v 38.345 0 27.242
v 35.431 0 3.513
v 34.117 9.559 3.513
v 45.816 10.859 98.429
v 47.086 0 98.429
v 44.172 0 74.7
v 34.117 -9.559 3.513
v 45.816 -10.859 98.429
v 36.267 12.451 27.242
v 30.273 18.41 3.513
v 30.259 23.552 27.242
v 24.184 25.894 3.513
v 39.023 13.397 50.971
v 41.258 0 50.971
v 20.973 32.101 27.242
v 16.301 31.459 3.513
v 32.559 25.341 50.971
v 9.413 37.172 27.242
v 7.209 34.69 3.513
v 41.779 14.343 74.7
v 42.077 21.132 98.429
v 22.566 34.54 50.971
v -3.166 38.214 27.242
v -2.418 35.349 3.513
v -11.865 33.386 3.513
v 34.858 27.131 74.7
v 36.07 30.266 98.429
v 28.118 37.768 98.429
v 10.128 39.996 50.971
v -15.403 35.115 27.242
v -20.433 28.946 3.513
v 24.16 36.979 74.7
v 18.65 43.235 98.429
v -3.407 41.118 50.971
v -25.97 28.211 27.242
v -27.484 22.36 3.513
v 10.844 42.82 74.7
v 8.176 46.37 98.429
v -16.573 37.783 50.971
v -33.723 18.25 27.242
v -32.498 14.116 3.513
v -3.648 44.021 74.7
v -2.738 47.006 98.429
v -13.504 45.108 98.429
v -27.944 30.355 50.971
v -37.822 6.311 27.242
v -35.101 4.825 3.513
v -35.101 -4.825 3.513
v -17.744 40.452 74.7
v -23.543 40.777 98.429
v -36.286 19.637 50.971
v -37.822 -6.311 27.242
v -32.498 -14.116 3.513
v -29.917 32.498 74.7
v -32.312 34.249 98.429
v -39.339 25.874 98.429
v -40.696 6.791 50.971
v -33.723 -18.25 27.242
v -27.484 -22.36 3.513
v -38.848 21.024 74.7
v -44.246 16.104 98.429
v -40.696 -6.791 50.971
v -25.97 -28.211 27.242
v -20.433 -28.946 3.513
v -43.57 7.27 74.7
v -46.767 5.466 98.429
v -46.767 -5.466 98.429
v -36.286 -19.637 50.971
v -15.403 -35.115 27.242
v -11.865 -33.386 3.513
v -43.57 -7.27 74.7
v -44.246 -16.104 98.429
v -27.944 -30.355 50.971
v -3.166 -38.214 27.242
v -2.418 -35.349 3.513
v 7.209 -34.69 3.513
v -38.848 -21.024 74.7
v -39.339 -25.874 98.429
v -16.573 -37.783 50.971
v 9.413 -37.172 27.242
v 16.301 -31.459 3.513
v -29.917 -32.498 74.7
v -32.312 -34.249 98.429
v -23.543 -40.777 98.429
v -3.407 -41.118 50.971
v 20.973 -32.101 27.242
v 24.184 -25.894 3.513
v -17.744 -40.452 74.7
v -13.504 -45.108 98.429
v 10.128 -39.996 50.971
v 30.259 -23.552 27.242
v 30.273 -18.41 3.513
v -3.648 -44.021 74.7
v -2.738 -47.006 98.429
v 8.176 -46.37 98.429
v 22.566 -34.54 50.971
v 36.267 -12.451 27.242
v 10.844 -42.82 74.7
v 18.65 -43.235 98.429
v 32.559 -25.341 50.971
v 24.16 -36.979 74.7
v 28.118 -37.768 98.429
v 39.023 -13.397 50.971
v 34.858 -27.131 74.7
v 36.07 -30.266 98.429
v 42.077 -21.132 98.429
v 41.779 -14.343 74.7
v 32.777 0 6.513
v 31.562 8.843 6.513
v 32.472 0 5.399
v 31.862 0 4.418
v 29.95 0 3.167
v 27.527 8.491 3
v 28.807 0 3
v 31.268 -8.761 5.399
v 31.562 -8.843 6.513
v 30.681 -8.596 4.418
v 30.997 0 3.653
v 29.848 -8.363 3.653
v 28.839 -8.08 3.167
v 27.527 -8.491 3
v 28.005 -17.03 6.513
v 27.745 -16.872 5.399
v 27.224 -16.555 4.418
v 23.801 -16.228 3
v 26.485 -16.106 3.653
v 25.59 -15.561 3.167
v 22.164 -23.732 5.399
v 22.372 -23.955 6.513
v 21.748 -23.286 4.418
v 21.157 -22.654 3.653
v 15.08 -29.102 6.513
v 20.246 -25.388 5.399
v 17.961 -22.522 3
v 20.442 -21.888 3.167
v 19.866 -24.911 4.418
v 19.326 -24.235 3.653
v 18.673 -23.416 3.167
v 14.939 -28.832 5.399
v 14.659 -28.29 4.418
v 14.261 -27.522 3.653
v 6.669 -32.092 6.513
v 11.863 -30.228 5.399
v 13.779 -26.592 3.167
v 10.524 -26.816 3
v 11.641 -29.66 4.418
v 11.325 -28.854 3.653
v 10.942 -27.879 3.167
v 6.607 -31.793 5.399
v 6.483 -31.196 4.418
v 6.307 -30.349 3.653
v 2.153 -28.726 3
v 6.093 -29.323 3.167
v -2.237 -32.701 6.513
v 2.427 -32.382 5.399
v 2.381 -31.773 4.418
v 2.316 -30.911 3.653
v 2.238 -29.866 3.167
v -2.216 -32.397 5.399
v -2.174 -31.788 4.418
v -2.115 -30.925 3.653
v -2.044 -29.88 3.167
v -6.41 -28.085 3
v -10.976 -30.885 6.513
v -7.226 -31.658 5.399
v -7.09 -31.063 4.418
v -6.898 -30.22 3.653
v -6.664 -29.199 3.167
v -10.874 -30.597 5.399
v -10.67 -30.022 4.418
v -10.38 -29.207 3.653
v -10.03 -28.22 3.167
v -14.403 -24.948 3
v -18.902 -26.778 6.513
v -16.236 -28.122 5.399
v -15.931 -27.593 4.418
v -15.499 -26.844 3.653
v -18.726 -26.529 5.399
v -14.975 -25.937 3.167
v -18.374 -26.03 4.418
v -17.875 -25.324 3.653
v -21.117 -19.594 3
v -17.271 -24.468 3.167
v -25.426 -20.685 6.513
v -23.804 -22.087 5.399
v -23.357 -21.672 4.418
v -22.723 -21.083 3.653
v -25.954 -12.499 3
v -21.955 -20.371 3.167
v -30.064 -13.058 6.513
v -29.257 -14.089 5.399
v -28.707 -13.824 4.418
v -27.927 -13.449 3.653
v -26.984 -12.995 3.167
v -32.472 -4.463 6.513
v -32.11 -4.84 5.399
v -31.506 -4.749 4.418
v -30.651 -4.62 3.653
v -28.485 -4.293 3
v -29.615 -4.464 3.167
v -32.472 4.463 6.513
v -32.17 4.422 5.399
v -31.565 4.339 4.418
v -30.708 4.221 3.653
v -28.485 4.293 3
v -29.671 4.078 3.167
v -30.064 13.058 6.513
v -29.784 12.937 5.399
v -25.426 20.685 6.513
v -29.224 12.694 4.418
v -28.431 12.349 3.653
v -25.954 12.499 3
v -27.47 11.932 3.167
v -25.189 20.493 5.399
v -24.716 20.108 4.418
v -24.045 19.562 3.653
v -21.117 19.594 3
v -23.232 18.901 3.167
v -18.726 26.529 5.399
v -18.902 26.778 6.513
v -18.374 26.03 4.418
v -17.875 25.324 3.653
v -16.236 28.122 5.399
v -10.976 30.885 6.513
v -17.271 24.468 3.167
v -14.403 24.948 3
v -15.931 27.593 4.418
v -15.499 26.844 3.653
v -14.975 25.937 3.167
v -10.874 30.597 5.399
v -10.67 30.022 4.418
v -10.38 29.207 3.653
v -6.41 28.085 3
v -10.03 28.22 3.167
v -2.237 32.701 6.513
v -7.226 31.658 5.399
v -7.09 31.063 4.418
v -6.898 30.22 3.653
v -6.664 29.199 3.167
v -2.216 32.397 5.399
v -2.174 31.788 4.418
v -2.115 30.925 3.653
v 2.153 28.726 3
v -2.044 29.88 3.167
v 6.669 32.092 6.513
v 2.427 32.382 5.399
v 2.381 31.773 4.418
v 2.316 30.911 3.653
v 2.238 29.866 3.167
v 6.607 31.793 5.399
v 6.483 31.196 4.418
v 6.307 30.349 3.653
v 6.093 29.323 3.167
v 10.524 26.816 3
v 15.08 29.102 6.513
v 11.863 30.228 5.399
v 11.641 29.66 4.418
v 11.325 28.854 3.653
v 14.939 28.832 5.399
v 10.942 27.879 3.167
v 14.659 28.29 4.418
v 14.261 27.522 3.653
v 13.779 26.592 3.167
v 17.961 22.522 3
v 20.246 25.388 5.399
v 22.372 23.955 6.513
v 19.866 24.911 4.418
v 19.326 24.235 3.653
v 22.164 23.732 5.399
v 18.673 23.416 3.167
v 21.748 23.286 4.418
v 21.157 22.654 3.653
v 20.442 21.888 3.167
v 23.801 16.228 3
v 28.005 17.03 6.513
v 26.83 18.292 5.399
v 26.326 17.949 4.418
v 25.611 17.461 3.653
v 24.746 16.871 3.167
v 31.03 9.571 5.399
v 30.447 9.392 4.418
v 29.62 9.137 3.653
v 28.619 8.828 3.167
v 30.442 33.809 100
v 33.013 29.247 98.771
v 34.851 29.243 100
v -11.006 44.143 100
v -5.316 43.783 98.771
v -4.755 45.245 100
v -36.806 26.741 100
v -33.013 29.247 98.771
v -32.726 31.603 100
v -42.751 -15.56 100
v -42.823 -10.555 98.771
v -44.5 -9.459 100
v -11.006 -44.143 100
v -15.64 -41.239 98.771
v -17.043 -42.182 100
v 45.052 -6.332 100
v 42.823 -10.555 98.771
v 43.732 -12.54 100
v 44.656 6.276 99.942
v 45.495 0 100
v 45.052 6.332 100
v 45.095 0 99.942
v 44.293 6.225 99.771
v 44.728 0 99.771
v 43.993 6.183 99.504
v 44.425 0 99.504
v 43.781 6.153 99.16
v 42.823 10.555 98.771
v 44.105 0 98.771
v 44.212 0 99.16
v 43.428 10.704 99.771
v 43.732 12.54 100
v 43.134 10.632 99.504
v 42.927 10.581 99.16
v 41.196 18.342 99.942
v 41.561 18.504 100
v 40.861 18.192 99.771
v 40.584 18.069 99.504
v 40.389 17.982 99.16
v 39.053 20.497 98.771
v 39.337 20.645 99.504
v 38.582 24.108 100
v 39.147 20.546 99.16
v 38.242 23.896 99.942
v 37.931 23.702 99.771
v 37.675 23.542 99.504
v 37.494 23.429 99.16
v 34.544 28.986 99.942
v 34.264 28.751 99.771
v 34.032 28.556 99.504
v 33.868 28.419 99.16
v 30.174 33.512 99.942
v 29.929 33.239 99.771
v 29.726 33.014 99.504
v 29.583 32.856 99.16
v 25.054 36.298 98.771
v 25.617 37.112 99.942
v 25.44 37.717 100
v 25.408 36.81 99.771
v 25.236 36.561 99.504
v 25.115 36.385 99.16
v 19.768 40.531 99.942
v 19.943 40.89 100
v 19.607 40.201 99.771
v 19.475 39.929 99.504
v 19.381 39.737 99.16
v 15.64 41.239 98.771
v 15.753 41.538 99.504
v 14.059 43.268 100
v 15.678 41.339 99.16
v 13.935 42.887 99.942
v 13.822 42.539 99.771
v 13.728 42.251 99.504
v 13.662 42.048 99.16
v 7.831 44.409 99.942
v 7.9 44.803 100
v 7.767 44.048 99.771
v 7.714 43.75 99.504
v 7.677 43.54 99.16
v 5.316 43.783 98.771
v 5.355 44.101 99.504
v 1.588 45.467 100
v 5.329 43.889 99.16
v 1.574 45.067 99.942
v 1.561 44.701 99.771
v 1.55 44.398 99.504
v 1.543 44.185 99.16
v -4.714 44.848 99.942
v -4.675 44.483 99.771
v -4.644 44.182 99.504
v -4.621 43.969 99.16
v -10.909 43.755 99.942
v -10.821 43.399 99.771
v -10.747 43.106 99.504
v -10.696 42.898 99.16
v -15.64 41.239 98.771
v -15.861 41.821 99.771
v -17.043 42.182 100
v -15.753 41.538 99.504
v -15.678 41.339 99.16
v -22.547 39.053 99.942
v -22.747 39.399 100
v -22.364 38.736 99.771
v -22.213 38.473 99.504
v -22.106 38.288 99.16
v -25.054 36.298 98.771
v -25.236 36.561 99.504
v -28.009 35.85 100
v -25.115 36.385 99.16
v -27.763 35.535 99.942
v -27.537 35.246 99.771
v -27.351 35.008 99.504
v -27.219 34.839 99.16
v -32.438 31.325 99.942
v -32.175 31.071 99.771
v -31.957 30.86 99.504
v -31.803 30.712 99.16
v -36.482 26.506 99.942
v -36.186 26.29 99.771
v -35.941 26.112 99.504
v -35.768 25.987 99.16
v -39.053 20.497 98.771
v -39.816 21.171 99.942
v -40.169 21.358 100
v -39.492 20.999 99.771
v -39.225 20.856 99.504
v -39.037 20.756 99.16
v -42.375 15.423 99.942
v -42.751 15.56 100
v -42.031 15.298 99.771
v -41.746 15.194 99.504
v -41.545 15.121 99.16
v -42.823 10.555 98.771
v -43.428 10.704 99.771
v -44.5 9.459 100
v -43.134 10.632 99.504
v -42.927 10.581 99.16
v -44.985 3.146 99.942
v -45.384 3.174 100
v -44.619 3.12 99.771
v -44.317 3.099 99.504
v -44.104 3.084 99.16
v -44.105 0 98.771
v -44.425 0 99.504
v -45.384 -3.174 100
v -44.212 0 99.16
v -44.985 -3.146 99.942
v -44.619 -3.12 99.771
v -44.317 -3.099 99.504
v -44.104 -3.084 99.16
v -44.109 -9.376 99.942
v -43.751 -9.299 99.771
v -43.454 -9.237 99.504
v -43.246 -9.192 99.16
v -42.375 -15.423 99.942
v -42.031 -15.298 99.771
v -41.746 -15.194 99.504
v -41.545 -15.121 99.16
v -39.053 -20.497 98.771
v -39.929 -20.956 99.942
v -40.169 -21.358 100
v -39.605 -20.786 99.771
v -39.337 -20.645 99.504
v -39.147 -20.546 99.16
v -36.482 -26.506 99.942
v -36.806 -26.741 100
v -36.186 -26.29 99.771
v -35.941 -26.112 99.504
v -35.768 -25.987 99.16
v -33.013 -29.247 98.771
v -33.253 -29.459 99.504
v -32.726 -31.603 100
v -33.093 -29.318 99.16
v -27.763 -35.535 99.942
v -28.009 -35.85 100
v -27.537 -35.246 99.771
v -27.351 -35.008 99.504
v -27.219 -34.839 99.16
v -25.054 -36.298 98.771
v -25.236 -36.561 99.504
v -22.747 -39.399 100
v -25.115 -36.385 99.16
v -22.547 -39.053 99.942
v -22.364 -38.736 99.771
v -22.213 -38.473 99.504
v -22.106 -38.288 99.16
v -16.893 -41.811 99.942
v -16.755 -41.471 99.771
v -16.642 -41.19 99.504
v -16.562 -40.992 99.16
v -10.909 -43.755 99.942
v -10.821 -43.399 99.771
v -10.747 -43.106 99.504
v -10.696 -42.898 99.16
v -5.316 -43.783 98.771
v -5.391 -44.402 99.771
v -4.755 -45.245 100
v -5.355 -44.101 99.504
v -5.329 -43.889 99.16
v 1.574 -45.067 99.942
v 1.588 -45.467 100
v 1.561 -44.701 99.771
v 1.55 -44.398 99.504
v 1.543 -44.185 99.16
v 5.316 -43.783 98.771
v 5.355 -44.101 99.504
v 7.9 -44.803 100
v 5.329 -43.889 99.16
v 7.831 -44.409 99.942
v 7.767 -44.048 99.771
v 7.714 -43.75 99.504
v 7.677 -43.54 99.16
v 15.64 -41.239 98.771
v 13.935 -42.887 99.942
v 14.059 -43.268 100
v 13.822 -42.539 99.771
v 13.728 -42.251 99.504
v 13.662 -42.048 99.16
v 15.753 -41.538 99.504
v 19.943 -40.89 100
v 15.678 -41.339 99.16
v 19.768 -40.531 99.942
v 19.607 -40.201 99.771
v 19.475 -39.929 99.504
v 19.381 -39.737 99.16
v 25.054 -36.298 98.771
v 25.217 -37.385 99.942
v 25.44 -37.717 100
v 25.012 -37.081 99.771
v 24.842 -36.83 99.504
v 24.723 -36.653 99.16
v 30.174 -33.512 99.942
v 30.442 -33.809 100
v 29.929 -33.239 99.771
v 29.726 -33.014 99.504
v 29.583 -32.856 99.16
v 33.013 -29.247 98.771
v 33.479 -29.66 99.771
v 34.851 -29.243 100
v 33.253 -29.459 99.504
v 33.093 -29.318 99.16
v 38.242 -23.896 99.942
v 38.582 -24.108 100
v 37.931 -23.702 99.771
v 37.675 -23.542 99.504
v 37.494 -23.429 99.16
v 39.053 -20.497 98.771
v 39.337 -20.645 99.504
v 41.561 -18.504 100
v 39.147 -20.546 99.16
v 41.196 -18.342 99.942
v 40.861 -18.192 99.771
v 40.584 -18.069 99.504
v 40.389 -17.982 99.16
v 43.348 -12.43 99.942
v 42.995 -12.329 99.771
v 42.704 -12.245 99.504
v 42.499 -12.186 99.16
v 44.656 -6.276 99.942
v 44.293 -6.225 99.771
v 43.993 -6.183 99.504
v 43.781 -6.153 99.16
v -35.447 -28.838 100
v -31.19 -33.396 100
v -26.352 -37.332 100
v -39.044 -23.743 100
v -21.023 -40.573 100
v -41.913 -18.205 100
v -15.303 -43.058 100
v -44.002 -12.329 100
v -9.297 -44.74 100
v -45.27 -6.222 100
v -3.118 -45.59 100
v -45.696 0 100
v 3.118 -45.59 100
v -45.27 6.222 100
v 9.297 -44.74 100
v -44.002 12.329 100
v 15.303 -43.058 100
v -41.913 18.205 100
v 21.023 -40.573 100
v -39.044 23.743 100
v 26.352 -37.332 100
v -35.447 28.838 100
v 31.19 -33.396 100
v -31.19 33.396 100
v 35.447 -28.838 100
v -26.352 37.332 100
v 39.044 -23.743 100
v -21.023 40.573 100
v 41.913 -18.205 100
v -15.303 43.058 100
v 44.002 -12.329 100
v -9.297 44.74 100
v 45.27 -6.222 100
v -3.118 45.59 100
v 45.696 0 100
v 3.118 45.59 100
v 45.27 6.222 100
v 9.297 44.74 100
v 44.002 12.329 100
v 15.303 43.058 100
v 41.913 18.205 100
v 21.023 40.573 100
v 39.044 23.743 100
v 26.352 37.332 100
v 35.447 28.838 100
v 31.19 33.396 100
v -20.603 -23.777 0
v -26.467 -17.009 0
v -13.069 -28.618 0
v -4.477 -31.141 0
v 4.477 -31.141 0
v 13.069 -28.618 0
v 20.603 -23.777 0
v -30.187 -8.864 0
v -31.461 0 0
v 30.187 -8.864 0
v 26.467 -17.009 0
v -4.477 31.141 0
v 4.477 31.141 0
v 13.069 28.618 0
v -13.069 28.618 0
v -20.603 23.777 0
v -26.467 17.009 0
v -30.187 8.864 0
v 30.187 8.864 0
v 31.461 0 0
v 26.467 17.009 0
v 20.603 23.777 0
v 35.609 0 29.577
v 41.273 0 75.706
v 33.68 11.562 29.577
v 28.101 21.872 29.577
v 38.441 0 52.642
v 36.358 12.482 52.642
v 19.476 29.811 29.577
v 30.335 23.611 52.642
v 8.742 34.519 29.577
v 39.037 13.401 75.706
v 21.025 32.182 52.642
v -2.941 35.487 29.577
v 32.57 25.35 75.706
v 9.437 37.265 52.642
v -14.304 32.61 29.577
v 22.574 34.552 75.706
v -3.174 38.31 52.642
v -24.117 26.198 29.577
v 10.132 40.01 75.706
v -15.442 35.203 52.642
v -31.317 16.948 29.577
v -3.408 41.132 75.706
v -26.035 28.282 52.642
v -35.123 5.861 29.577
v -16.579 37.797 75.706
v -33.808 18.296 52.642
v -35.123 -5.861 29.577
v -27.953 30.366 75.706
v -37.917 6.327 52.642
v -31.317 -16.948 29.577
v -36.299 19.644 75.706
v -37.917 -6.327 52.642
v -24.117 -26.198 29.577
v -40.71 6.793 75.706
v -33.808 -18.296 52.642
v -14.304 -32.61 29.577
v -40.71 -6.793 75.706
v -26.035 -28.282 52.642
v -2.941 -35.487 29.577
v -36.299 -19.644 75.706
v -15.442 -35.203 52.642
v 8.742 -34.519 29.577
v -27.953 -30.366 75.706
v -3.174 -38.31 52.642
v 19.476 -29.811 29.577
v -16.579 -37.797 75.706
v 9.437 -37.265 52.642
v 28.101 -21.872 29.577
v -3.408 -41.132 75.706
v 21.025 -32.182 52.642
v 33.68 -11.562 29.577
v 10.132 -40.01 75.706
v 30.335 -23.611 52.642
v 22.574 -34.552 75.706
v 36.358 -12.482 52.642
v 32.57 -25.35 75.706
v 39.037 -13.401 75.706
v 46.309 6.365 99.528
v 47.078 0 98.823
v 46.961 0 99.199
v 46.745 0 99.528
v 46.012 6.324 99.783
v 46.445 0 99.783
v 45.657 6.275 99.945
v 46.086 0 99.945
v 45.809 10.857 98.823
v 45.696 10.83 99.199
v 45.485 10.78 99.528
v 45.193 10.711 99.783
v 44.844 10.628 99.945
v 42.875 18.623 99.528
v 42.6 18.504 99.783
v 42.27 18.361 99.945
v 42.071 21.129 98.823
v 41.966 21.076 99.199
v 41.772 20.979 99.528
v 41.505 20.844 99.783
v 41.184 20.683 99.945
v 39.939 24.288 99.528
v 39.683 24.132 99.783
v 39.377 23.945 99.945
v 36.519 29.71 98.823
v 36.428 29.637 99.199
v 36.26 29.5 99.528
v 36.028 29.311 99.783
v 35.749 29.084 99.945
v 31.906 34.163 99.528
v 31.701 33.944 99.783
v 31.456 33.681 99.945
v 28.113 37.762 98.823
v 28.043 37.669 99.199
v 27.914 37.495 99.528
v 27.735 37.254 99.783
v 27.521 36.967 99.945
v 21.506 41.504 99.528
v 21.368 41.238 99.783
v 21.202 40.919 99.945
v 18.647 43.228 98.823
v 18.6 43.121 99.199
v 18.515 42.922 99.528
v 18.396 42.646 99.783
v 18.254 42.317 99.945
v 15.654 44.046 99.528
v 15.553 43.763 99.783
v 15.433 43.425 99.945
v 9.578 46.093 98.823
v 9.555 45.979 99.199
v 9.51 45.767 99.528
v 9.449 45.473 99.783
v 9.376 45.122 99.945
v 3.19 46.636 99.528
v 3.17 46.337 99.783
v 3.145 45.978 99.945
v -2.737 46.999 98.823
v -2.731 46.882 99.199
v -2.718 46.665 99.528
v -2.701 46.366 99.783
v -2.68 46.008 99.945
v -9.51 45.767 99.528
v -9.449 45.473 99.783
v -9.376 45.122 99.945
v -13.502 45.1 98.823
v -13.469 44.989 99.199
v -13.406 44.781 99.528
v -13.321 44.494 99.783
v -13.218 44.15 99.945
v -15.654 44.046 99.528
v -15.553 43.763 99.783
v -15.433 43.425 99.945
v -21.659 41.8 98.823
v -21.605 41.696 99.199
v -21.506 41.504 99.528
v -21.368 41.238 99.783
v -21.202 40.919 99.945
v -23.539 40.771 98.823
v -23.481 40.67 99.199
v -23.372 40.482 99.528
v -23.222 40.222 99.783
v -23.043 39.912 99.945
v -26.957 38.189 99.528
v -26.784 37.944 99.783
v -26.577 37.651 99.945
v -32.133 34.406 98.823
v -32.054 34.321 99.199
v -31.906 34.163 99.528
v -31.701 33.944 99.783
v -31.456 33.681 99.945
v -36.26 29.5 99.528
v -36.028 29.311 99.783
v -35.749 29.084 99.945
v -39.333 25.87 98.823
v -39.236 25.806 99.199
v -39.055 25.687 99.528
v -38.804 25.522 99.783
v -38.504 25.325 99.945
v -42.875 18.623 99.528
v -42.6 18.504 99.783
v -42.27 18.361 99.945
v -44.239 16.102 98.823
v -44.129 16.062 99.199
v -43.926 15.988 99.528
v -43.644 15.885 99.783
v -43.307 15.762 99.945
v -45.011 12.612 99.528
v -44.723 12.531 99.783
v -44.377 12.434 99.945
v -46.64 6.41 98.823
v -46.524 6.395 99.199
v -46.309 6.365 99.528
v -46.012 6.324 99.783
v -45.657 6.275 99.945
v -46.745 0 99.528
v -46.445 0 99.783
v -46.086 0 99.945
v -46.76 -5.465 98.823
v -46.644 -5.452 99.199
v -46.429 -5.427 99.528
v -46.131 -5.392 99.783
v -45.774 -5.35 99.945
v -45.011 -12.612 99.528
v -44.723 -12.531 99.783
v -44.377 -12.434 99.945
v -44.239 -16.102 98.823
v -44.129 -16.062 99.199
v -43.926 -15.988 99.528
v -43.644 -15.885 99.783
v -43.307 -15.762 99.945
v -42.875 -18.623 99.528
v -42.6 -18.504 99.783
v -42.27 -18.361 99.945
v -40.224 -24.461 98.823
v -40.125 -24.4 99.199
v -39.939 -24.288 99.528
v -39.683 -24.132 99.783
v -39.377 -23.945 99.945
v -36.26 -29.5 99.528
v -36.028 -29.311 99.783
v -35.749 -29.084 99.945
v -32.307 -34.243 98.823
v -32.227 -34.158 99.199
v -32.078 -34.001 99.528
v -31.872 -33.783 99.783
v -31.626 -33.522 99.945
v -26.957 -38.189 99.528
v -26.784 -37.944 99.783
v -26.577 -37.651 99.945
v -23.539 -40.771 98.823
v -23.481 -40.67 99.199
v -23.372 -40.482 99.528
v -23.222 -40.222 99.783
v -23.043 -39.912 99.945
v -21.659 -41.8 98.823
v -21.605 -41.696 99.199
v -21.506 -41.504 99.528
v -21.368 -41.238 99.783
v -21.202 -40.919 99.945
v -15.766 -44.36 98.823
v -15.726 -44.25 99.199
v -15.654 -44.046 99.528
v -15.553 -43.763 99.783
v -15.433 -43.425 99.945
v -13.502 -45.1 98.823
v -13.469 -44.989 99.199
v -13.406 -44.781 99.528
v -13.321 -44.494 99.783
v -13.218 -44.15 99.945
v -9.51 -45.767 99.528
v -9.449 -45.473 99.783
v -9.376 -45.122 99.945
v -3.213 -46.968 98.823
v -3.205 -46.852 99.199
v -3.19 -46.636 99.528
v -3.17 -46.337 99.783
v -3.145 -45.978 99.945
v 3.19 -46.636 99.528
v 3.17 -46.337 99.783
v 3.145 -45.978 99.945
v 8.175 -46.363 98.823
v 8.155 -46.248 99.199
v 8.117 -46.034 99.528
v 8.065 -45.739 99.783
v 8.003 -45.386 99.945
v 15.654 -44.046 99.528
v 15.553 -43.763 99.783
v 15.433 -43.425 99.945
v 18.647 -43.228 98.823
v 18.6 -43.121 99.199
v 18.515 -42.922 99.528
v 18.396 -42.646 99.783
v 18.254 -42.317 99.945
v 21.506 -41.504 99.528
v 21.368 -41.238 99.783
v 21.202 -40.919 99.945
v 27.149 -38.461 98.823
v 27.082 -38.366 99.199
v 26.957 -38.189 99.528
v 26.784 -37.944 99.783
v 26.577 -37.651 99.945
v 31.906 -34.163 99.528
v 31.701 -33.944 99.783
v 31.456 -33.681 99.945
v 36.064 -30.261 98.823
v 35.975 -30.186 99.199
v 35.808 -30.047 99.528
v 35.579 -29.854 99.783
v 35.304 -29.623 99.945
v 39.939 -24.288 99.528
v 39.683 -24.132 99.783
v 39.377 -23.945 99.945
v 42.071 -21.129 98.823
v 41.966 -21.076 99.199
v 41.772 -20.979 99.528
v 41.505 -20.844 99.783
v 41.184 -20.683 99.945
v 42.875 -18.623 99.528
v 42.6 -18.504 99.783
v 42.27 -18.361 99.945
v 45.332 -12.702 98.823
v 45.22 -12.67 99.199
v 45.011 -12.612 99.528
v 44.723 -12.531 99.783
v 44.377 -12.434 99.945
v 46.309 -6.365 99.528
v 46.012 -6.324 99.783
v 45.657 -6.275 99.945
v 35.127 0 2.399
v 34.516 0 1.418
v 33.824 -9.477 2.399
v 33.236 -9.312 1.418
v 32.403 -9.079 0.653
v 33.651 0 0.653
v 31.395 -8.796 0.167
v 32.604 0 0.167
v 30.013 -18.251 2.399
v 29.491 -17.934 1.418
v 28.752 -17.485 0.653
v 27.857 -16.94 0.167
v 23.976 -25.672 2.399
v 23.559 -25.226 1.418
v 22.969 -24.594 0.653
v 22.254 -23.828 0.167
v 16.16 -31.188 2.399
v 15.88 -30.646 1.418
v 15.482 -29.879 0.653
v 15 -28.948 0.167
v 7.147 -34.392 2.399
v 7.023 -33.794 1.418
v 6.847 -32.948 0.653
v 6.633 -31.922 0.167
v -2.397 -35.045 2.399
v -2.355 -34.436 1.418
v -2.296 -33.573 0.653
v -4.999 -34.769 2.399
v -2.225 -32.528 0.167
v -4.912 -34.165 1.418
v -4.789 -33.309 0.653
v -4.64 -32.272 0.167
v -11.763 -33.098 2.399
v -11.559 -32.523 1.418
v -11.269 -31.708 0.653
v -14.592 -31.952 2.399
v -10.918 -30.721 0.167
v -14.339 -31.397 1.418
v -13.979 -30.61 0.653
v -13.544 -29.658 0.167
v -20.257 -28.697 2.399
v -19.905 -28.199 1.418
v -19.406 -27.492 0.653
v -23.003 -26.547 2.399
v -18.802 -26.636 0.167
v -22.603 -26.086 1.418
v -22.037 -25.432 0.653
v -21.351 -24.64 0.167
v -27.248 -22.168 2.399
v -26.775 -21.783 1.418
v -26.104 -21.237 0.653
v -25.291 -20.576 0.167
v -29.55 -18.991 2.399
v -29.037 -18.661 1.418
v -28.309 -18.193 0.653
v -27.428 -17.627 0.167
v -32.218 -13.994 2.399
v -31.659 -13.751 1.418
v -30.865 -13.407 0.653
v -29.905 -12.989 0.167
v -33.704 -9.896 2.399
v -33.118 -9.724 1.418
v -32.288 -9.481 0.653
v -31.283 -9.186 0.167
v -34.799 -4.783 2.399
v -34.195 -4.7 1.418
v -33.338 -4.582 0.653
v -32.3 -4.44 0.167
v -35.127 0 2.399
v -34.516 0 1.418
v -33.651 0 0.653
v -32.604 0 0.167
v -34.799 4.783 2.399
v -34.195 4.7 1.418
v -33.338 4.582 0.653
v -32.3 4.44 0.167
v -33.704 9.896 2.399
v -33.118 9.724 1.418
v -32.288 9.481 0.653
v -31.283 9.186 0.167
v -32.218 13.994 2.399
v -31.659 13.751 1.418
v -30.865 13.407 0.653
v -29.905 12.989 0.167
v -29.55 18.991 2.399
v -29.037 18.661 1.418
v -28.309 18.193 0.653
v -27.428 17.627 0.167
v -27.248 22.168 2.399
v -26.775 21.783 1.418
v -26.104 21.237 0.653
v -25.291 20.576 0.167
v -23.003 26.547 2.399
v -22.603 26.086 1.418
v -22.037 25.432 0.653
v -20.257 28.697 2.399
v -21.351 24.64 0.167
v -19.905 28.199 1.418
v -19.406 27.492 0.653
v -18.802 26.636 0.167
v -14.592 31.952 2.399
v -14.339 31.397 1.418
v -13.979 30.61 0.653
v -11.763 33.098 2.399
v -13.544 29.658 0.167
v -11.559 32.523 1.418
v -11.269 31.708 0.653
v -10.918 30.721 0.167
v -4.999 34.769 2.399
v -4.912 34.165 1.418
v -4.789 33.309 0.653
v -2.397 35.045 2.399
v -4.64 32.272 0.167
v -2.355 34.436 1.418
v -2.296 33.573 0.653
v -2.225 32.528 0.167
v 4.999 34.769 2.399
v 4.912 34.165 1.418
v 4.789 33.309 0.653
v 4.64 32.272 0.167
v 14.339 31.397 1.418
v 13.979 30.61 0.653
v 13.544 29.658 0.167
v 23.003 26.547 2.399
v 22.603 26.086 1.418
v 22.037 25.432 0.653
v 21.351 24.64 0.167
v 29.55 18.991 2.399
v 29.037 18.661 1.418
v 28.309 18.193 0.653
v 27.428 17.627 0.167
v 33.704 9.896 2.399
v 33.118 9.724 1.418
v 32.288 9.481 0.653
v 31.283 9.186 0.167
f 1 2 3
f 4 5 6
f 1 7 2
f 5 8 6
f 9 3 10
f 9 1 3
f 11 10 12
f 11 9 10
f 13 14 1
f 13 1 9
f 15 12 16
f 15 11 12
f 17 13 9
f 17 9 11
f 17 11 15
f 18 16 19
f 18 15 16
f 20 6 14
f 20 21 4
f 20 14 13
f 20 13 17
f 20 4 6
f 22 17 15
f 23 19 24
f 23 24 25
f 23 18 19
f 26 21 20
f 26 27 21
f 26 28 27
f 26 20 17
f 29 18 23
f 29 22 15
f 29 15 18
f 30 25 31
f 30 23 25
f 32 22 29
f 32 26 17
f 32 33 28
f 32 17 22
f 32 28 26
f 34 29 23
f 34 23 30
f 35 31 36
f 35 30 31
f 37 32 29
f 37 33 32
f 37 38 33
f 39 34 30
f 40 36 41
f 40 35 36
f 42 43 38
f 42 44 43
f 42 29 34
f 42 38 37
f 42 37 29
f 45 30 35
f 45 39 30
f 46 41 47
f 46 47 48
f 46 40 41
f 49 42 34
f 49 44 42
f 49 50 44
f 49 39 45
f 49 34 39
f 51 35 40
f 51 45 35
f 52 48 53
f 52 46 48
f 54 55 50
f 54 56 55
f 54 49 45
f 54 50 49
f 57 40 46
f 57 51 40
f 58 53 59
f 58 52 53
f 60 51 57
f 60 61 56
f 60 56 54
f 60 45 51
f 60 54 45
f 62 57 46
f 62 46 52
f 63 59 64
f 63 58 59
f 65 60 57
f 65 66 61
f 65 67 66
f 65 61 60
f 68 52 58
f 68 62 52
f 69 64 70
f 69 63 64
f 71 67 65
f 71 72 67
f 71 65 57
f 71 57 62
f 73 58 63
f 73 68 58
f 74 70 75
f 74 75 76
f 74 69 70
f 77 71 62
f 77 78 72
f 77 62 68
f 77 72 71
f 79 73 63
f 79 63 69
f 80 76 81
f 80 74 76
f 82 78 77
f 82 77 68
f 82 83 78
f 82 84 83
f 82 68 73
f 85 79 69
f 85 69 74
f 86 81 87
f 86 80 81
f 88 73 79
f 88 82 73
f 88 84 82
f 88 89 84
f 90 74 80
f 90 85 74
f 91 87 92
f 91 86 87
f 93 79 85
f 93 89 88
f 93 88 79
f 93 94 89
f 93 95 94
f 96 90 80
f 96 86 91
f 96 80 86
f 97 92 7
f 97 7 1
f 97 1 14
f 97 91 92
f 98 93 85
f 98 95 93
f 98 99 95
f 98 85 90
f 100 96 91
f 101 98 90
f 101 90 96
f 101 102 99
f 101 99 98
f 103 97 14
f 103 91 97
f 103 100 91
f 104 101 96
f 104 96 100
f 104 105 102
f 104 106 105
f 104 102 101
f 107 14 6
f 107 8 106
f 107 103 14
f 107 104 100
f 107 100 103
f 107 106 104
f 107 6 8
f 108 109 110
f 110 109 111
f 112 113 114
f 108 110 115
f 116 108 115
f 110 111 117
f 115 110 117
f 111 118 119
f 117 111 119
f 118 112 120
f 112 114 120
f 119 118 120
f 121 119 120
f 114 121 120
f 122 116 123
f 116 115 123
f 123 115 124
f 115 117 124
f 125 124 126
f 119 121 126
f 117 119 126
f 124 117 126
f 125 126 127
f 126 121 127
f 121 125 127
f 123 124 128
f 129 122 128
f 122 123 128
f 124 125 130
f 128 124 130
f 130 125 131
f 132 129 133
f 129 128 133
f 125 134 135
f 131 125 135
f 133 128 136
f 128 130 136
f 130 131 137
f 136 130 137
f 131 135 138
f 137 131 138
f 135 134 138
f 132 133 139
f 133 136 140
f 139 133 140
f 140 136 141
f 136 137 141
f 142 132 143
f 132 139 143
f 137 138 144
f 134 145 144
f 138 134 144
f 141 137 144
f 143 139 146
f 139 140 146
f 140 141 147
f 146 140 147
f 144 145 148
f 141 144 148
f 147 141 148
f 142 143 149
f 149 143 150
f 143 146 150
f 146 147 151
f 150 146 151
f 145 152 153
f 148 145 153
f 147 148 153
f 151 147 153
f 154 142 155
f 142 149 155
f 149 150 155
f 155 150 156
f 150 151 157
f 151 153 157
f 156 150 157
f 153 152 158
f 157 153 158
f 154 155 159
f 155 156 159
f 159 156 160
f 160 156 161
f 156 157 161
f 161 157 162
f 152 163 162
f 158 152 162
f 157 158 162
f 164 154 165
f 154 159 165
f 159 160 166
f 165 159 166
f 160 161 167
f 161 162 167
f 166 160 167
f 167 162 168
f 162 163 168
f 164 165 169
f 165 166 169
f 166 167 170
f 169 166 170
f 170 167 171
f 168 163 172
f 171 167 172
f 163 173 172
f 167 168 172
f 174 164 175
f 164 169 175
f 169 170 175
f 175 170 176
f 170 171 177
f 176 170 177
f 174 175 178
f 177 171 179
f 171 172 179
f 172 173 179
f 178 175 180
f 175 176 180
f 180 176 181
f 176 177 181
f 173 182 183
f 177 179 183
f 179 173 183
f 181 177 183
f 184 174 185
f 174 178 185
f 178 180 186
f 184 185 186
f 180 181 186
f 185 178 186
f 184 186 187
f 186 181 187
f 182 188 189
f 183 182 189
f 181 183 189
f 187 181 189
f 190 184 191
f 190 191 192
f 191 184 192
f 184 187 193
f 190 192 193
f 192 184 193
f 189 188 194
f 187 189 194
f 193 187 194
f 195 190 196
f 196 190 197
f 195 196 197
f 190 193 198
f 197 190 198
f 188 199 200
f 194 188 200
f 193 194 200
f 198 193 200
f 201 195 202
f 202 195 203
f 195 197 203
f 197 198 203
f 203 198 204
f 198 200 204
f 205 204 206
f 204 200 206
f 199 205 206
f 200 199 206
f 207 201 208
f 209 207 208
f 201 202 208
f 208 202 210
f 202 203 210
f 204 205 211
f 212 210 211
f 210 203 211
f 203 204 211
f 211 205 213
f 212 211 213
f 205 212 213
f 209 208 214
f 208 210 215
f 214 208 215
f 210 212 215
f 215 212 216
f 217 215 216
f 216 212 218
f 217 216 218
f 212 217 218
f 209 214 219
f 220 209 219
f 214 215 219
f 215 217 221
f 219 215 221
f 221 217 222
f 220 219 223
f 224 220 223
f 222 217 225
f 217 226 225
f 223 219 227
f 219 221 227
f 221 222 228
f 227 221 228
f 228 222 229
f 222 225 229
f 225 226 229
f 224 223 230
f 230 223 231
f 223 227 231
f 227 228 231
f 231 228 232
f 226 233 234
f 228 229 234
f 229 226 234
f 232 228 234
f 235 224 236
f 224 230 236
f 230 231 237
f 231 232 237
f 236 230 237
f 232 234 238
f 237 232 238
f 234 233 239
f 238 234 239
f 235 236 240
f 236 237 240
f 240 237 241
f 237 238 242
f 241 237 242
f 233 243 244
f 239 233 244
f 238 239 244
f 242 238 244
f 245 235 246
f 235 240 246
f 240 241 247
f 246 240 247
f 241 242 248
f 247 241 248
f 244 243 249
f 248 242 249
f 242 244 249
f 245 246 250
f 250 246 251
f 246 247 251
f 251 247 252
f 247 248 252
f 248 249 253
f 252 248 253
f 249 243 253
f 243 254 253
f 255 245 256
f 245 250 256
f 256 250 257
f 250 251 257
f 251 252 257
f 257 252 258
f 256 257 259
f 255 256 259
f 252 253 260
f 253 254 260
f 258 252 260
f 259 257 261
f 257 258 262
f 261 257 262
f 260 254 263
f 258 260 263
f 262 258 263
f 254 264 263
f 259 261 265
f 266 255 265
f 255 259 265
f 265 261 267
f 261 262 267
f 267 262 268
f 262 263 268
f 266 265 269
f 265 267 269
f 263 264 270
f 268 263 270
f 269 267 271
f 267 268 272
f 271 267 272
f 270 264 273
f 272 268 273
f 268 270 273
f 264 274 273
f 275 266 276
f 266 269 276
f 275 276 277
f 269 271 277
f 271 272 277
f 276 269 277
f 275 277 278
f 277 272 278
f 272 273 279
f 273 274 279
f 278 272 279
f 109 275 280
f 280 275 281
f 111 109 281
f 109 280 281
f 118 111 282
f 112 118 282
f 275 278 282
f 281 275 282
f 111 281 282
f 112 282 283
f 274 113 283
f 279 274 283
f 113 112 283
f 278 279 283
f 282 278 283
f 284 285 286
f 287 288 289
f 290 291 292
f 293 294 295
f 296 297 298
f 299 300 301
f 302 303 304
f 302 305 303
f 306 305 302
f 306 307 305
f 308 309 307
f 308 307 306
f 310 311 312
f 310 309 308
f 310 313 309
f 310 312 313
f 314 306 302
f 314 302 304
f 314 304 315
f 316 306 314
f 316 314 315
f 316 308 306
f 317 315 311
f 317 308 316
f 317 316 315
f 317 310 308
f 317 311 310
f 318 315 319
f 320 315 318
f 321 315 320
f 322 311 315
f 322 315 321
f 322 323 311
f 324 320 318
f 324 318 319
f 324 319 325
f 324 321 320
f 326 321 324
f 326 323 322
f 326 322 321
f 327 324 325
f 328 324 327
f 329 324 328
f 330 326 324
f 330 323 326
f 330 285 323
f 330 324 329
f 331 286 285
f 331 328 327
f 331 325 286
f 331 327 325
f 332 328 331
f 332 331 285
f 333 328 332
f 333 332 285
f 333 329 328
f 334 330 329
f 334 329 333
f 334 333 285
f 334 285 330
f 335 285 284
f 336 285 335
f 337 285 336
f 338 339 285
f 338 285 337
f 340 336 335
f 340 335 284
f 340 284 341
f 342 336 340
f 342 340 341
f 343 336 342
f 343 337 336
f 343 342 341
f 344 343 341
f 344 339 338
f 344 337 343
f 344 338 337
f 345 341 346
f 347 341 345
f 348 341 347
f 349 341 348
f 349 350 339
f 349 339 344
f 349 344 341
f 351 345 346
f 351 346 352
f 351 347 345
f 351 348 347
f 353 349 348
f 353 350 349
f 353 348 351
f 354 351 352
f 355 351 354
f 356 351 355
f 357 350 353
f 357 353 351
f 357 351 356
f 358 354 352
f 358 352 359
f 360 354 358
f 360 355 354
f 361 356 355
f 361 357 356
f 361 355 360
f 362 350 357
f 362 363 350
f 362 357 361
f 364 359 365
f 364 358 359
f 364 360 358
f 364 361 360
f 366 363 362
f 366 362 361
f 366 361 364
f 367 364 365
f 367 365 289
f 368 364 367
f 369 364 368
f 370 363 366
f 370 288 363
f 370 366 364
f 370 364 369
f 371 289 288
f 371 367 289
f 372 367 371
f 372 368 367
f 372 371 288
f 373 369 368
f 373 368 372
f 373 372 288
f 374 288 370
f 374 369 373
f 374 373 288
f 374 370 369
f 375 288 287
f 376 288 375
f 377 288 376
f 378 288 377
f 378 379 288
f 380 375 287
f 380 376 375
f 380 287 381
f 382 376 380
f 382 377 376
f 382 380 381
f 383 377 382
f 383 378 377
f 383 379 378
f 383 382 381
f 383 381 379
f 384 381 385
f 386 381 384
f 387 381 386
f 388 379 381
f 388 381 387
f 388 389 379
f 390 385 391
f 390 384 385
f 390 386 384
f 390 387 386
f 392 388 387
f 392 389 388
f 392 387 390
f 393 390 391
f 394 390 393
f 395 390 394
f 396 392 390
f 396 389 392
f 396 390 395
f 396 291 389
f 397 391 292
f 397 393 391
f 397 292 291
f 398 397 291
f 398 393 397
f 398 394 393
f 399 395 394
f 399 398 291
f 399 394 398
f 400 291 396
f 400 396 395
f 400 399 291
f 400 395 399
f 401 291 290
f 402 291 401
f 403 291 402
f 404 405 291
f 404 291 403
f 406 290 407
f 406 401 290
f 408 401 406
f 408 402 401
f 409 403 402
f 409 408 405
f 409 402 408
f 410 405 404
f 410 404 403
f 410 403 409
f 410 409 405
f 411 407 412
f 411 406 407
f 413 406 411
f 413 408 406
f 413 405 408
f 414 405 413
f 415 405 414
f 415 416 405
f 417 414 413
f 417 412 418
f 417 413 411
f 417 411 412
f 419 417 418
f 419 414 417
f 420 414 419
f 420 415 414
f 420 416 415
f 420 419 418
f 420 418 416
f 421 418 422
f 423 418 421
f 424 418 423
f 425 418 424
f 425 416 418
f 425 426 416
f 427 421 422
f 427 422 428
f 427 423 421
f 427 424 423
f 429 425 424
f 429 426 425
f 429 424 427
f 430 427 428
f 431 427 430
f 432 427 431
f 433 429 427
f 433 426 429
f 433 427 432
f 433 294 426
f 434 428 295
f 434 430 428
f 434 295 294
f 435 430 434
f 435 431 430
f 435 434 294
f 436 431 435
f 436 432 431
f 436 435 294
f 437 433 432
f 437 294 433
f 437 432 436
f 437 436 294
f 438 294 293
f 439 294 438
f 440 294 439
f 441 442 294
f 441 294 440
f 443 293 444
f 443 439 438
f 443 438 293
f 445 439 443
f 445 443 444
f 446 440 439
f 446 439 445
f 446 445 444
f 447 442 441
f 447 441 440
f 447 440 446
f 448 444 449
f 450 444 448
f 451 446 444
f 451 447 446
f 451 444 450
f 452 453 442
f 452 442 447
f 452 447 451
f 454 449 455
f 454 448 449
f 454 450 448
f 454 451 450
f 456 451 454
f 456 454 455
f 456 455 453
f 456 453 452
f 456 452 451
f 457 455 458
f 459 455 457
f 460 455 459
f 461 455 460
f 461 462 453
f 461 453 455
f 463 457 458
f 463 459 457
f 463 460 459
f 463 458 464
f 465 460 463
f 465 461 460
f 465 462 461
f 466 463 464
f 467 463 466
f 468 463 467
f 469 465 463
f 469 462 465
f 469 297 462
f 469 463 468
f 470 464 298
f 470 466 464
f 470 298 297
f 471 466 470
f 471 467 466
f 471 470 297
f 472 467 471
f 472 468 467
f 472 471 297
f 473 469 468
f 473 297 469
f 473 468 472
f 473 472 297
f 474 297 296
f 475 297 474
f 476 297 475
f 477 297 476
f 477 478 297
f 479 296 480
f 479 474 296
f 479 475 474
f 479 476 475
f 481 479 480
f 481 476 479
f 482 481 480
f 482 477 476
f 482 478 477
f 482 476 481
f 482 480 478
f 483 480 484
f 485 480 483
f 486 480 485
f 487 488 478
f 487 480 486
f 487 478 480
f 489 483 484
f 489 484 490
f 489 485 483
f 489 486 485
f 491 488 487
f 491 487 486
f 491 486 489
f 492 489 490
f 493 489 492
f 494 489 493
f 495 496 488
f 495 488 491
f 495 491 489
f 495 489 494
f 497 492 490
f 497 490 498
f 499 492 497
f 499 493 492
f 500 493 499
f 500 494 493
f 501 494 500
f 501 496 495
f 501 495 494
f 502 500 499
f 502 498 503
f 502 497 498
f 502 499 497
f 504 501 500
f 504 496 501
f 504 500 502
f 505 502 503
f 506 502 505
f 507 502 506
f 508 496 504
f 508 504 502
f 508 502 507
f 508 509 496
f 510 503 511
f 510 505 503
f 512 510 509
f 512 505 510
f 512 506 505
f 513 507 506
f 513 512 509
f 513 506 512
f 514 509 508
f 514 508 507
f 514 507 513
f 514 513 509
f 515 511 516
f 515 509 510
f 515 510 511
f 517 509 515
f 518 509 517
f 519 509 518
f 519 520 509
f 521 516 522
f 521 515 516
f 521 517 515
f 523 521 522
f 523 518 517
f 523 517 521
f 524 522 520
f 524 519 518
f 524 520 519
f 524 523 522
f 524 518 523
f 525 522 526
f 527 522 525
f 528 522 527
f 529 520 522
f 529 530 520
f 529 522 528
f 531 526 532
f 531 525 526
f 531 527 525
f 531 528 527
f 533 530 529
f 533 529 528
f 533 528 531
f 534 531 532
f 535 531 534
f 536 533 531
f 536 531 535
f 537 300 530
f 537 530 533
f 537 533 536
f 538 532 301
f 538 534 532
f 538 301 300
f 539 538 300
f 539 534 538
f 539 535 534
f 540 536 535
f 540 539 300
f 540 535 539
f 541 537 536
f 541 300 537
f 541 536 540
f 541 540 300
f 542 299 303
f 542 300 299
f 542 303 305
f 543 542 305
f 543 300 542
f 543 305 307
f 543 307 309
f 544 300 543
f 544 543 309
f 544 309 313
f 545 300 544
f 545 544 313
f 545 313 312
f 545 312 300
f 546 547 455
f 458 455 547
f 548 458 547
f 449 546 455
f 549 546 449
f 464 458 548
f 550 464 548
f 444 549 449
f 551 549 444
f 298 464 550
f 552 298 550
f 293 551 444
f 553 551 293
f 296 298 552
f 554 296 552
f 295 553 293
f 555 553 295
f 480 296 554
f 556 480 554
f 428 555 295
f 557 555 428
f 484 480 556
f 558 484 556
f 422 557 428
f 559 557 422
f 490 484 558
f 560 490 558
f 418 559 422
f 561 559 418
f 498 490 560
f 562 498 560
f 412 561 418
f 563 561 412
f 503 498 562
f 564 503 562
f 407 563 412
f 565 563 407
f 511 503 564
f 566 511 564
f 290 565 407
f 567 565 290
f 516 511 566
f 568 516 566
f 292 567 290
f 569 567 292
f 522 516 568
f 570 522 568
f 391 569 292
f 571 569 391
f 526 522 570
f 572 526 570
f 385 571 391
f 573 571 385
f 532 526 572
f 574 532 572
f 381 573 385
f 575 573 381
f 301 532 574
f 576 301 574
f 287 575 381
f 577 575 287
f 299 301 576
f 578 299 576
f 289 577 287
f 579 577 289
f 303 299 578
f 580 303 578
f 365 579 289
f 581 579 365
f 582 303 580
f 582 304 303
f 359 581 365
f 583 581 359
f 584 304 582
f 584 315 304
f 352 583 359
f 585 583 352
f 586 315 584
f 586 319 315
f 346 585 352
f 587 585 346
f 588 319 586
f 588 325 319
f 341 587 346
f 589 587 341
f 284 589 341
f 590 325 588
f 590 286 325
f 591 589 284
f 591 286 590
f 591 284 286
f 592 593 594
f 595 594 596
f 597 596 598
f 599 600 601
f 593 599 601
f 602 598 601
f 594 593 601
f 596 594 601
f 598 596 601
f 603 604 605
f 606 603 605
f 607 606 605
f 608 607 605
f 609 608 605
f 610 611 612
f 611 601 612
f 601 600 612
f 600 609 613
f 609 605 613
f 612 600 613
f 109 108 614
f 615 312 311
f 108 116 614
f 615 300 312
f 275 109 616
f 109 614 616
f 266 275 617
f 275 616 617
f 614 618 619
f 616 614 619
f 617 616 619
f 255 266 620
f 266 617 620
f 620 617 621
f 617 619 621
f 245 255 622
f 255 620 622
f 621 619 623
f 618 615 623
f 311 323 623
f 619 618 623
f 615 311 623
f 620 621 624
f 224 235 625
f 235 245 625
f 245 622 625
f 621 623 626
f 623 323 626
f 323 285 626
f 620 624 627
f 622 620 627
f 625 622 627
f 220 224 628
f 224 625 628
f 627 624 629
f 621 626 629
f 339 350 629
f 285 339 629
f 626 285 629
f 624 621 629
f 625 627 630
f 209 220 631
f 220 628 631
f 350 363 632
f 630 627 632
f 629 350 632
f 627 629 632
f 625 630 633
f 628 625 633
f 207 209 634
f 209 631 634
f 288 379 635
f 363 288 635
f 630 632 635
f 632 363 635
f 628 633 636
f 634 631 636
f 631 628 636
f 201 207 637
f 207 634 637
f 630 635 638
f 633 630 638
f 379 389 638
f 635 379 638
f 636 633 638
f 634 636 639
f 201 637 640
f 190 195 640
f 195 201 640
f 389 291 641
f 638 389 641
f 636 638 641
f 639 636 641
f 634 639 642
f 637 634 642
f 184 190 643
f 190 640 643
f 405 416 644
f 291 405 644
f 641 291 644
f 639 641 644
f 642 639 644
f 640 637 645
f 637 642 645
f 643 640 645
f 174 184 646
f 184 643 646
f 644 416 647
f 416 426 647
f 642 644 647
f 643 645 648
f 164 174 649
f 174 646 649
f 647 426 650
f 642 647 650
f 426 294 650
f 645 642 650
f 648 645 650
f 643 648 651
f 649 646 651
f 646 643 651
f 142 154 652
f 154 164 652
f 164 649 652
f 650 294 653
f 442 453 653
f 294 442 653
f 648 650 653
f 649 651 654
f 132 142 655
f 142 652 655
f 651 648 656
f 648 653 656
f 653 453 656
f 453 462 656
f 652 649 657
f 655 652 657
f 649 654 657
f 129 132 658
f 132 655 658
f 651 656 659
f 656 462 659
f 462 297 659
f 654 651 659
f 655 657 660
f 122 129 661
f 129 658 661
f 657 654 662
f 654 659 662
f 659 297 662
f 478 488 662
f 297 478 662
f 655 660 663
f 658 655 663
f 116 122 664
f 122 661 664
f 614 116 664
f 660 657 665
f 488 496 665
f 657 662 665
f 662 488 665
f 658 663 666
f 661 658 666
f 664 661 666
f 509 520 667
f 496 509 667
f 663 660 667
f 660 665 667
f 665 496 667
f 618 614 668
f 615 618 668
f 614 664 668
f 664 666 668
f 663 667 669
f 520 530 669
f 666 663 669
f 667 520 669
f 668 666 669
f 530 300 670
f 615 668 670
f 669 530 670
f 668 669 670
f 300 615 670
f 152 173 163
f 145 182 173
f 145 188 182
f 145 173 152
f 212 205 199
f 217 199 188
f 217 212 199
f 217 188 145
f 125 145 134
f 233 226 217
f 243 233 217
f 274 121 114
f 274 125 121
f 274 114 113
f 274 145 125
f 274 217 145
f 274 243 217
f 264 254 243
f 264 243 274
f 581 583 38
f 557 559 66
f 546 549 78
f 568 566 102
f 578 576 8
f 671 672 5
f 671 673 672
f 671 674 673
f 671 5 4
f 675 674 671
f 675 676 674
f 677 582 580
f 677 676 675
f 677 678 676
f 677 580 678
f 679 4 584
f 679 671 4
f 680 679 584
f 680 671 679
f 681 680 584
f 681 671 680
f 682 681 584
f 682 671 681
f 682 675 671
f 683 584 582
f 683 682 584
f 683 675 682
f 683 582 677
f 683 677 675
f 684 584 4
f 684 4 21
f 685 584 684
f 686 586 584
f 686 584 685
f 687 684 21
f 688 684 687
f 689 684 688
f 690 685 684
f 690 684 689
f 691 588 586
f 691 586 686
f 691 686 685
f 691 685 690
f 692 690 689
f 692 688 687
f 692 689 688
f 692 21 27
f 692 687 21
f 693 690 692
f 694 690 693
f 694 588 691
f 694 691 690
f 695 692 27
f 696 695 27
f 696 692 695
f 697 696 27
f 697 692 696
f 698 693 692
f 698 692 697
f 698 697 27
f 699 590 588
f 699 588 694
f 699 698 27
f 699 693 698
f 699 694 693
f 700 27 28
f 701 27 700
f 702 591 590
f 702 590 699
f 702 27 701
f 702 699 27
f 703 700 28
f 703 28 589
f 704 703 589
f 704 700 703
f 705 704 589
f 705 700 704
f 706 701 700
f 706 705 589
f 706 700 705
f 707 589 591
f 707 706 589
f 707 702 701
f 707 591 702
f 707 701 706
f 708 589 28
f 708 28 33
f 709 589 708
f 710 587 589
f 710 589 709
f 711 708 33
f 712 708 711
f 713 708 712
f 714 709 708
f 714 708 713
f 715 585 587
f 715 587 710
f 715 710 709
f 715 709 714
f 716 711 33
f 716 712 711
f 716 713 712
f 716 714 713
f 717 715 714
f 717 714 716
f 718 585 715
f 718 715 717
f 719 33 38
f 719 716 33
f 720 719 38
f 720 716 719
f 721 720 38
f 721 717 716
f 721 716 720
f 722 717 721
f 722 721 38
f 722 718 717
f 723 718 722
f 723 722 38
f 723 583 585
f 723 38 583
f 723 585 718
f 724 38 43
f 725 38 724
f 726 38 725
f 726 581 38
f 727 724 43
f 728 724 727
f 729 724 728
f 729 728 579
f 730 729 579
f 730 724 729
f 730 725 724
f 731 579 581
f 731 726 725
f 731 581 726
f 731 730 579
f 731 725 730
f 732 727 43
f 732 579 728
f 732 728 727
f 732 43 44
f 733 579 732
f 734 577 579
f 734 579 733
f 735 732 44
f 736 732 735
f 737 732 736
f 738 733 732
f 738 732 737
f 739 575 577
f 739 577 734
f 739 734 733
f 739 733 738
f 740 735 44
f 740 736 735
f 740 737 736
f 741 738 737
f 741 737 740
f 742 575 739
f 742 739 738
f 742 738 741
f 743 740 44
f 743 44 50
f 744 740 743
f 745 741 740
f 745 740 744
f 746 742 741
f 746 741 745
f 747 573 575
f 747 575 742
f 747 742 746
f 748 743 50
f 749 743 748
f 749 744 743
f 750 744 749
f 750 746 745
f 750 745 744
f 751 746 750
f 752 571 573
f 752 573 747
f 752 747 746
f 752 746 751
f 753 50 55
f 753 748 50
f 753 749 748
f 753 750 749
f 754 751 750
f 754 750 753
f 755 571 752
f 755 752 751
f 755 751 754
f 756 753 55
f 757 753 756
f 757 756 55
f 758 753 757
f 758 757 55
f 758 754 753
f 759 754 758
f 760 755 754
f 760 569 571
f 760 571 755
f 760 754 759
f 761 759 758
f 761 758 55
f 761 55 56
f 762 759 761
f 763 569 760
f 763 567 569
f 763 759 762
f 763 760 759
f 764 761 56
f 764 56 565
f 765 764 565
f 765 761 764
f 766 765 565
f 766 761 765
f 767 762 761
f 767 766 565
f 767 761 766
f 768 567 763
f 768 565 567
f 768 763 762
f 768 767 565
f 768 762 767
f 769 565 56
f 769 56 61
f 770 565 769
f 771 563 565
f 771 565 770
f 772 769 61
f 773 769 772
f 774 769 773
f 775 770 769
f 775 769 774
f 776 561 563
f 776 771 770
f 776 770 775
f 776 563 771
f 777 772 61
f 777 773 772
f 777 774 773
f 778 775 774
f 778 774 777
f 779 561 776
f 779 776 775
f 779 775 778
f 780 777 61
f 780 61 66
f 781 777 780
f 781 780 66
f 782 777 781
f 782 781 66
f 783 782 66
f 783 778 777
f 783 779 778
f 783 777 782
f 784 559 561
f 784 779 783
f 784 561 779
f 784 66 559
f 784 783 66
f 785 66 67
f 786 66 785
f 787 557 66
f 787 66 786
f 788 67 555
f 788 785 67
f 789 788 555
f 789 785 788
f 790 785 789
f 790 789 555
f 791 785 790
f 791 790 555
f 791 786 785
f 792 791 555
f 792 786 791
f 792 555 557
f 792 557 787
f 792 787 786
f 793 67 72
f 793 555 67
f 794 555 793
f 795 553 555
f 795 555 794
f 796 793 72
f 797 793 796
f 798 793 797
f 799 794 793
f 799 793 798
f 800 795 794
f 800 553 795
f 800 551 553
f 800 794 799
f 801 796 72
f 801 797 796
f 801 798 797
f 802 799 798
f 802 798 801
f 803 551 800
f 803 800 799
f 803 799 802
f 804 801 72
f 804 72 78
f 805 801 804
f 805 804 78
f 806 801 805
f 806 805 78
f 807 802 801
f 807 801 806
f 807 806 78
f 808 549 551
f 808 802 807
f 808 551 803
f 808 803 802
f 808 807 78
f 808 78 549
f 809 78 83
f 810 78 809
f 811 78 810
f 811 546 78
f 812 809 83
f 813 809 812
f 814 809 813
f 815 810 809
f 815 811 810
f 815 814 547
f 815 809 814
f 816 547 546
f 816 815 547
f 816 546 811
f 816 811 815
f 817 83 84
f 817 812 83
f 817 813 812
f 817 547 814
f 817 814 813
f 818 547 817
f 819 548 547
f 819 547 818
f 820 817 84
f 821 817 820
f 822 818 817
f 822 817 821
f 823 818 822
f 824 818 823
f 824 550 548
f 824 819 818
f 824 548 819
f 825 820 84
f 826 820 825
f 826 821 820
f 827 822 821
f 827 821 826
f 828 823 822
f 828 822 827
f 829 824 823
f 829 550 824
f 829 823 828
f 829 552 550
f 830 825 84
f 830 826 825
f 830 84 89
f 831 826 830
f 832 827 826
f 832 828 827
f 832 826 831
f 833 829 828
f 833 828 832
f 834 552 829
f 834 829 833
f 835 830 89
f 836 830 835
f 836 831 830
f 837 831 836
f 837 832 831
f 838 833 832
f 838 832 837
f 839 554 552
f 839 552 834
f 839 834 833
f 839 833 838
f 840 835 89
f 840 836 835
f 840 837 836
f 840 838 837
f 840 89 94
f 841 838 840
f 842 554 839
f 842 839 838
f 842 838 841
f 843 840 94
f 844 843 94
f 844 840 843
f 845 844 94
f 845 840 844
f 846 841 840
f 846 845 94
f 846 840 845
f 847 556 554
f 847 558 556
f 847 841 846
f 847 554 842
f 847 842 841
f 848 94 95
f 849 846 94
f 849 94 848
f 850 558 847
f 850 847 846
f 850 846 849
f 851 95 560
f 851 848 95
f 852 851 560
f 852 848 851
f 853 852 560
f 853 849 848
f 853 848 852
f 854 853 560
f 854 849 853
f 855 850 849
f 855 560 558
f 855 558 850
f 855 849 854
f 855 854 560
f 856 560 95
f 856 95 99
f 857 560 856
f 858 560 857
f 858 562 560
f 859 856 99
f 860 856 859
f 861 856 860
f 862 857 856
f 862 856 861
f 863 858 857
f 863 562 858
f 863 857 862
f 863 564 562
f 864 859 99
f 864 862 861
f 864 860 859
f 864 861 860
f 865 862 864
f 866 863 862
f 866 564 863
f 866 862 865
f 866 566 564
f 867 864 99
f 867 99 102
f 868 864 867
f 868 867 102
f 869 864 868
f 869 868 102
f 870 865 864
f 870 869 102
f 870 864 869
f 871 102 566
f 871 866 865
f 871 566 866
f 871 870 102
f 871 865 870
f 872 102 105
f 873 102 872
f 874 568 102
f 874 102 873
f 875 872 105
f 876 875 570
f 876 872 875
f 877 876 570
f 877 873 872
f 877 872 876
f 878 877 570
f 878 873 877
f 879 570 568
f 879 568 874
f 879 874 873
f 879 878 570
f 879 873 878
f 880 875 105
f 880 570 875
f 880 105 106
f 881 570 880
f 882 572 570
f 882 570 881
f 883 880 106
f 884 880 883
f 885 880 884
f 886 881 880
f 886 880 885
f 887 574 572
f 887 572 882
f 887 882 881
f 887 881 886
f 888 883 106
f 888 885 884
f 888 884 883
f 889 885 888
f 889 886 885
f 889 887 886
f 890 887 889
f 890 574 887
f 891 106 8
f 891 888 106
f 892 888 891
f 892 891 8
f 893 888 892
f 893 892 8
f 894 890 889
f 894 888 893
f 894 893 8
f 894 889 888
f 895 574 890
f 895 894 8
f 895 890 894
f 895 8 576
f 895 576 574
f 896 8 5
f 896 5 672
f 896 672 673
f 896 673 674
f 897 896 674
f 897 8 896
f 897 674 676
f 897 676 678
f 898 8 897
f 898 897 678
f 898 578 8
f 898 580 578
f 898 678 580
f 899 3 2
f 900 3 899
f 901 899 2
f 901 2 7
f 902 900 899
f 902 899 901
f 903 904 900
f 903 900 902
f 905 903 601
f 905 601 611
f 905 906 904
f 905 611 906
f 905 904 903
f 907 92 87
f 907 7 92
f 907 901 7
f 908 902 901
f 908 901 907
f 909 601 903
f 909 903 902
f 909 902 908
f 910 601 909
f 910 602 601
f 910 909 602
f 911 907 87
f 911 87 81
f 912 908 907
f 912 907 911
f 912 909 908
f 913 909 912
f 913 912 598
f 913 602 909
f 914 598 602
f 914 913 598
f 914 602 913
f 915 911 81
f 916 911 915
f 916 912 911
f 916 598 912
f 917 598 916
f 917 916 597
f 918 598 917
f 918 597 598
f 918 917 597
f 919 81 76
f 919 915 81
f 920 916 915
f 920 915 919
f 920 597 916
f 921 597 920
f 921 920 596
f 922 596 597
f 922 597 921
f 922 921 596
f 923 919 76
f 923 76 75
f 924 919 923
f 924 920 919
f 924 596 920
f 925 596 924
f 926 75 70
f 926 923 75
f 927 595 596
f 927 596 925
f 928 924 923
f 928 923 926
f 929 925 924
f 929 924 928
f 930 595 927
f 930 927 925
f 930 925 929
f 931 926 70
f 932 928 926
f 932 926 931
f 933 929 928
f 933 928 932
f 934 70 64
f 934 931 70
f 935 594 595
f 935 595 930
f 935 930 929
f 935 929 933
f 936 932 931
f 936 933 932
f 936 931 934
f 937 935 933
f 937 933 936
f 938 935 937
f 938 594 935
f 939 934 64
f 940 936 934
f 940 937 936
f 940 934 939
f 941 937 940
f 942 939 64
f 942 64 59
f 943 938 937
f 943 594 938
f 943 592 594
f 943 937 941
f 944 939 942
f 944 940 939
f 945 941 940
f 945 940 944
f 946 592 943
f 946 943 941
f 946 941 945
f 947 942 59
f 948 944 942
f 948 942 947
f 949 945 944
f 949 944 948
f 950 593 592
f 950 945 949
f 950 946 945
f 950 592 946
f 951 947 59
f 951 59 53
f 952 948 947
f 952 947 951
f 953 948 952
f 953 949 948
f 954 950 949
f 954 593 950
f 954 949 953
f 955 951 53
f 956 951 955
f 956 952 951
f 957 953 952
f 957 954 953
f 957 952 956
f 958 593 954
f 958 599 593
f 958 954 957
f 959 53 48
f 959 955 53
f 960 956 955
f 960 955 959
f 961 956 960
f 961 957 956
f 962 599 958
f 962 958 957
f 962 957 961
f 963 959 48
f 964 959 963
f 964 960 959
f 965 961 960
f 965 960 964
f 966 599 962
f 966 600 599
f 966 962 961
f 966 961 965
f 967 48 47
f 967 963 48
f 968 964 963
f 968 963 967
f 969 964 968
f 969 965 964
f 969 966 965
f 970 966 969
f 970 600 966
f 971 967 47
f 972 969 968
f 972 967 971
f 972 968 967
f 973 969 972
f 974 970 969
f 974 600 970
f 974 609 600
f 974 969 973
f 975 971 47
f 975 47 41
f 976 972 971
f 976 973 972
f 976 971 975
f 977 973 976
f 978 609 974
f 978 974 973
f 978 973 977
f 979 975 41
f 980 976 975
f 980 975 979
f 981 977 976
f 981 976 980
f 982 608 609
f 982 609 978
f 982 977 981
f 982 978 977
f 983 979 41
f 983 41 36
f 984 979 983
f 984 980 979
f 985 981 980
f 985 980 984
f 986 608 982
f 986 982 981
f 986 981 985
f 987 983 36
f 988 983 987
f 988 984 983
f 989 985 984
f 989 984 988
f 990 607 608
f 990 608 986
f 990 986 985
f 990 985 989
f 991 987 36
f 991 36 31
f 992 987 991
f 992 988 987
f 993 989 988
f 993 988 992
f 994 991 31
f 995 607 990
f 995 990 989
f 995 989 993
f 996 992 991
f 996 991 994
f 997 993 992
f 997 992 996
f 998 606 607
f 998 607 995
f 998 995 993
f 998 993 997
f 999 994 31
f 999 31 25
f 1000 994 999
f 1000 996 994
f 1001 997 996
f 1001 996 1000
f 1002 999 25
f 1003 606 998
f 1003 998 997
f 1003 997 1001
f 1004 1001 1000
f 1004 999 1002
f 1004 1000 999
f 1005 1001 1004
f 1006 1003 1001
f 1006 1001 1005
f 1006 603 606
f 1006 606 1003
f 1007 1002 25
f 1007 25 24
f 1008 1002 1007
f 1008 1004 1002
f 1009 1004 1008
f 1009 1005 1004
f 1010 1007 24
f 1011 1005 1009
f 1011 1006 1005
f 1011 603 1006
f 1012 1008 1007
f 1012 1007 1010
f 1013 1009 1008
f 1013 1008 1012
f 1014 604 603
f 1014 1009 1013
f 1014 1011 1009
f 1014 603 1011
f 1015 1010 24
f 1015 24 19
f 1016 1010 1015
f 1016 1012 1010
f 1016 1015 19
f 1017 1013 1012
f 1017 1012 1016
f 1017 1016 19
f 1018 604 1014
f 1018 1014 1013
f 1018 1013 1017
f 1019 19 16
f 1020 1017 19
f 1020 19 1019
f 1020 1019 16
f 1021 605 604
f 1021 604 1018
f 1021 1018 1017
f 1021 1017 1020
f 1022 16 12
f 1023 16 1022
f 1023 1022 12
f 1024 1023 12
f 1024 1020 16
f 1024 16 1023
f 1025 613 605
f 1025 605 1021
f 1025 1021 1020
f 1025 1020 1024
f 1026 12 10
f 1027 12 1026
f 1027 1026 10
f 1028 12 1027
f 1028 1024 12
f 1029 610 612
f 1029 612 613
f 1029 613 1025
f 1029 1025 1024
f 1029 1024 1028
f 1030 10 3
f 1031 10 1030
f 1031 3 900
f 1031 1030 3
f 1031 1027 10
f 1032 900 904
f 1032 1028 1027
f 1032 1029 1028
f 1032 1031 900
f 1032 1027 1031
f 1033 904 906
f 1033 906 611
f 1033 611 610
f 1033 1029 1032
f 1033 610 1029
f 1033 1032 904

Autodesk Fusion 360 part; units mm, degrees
sketch "스케치1" plane through (0, 0, 0) normal (0, 0, 1) x (1, 0, 0)
sketch "스케치2" plane through (0, 0, 0) normal (0, 0, 1) x (1, 0, 0)
  circle A0 centre (0, 0) radius 35
  dimension "d1" = 70
extrude "돌출1" add sketch "스케치2" along normal blind 100 draft 7
shell "쉘1" thickness 3 removed faces 1 at (-3.1952, -13.2971, 100)
fillet "필렛1" radius 1.4 2 edges at (-44.079, 17.0966, 100) (-41.261, 16.0036, 100)
fillet "필렛2" radius 4 2 edges at (-32.6315, -12.6565, 0) (-30.1569, -11.6967, 3)
